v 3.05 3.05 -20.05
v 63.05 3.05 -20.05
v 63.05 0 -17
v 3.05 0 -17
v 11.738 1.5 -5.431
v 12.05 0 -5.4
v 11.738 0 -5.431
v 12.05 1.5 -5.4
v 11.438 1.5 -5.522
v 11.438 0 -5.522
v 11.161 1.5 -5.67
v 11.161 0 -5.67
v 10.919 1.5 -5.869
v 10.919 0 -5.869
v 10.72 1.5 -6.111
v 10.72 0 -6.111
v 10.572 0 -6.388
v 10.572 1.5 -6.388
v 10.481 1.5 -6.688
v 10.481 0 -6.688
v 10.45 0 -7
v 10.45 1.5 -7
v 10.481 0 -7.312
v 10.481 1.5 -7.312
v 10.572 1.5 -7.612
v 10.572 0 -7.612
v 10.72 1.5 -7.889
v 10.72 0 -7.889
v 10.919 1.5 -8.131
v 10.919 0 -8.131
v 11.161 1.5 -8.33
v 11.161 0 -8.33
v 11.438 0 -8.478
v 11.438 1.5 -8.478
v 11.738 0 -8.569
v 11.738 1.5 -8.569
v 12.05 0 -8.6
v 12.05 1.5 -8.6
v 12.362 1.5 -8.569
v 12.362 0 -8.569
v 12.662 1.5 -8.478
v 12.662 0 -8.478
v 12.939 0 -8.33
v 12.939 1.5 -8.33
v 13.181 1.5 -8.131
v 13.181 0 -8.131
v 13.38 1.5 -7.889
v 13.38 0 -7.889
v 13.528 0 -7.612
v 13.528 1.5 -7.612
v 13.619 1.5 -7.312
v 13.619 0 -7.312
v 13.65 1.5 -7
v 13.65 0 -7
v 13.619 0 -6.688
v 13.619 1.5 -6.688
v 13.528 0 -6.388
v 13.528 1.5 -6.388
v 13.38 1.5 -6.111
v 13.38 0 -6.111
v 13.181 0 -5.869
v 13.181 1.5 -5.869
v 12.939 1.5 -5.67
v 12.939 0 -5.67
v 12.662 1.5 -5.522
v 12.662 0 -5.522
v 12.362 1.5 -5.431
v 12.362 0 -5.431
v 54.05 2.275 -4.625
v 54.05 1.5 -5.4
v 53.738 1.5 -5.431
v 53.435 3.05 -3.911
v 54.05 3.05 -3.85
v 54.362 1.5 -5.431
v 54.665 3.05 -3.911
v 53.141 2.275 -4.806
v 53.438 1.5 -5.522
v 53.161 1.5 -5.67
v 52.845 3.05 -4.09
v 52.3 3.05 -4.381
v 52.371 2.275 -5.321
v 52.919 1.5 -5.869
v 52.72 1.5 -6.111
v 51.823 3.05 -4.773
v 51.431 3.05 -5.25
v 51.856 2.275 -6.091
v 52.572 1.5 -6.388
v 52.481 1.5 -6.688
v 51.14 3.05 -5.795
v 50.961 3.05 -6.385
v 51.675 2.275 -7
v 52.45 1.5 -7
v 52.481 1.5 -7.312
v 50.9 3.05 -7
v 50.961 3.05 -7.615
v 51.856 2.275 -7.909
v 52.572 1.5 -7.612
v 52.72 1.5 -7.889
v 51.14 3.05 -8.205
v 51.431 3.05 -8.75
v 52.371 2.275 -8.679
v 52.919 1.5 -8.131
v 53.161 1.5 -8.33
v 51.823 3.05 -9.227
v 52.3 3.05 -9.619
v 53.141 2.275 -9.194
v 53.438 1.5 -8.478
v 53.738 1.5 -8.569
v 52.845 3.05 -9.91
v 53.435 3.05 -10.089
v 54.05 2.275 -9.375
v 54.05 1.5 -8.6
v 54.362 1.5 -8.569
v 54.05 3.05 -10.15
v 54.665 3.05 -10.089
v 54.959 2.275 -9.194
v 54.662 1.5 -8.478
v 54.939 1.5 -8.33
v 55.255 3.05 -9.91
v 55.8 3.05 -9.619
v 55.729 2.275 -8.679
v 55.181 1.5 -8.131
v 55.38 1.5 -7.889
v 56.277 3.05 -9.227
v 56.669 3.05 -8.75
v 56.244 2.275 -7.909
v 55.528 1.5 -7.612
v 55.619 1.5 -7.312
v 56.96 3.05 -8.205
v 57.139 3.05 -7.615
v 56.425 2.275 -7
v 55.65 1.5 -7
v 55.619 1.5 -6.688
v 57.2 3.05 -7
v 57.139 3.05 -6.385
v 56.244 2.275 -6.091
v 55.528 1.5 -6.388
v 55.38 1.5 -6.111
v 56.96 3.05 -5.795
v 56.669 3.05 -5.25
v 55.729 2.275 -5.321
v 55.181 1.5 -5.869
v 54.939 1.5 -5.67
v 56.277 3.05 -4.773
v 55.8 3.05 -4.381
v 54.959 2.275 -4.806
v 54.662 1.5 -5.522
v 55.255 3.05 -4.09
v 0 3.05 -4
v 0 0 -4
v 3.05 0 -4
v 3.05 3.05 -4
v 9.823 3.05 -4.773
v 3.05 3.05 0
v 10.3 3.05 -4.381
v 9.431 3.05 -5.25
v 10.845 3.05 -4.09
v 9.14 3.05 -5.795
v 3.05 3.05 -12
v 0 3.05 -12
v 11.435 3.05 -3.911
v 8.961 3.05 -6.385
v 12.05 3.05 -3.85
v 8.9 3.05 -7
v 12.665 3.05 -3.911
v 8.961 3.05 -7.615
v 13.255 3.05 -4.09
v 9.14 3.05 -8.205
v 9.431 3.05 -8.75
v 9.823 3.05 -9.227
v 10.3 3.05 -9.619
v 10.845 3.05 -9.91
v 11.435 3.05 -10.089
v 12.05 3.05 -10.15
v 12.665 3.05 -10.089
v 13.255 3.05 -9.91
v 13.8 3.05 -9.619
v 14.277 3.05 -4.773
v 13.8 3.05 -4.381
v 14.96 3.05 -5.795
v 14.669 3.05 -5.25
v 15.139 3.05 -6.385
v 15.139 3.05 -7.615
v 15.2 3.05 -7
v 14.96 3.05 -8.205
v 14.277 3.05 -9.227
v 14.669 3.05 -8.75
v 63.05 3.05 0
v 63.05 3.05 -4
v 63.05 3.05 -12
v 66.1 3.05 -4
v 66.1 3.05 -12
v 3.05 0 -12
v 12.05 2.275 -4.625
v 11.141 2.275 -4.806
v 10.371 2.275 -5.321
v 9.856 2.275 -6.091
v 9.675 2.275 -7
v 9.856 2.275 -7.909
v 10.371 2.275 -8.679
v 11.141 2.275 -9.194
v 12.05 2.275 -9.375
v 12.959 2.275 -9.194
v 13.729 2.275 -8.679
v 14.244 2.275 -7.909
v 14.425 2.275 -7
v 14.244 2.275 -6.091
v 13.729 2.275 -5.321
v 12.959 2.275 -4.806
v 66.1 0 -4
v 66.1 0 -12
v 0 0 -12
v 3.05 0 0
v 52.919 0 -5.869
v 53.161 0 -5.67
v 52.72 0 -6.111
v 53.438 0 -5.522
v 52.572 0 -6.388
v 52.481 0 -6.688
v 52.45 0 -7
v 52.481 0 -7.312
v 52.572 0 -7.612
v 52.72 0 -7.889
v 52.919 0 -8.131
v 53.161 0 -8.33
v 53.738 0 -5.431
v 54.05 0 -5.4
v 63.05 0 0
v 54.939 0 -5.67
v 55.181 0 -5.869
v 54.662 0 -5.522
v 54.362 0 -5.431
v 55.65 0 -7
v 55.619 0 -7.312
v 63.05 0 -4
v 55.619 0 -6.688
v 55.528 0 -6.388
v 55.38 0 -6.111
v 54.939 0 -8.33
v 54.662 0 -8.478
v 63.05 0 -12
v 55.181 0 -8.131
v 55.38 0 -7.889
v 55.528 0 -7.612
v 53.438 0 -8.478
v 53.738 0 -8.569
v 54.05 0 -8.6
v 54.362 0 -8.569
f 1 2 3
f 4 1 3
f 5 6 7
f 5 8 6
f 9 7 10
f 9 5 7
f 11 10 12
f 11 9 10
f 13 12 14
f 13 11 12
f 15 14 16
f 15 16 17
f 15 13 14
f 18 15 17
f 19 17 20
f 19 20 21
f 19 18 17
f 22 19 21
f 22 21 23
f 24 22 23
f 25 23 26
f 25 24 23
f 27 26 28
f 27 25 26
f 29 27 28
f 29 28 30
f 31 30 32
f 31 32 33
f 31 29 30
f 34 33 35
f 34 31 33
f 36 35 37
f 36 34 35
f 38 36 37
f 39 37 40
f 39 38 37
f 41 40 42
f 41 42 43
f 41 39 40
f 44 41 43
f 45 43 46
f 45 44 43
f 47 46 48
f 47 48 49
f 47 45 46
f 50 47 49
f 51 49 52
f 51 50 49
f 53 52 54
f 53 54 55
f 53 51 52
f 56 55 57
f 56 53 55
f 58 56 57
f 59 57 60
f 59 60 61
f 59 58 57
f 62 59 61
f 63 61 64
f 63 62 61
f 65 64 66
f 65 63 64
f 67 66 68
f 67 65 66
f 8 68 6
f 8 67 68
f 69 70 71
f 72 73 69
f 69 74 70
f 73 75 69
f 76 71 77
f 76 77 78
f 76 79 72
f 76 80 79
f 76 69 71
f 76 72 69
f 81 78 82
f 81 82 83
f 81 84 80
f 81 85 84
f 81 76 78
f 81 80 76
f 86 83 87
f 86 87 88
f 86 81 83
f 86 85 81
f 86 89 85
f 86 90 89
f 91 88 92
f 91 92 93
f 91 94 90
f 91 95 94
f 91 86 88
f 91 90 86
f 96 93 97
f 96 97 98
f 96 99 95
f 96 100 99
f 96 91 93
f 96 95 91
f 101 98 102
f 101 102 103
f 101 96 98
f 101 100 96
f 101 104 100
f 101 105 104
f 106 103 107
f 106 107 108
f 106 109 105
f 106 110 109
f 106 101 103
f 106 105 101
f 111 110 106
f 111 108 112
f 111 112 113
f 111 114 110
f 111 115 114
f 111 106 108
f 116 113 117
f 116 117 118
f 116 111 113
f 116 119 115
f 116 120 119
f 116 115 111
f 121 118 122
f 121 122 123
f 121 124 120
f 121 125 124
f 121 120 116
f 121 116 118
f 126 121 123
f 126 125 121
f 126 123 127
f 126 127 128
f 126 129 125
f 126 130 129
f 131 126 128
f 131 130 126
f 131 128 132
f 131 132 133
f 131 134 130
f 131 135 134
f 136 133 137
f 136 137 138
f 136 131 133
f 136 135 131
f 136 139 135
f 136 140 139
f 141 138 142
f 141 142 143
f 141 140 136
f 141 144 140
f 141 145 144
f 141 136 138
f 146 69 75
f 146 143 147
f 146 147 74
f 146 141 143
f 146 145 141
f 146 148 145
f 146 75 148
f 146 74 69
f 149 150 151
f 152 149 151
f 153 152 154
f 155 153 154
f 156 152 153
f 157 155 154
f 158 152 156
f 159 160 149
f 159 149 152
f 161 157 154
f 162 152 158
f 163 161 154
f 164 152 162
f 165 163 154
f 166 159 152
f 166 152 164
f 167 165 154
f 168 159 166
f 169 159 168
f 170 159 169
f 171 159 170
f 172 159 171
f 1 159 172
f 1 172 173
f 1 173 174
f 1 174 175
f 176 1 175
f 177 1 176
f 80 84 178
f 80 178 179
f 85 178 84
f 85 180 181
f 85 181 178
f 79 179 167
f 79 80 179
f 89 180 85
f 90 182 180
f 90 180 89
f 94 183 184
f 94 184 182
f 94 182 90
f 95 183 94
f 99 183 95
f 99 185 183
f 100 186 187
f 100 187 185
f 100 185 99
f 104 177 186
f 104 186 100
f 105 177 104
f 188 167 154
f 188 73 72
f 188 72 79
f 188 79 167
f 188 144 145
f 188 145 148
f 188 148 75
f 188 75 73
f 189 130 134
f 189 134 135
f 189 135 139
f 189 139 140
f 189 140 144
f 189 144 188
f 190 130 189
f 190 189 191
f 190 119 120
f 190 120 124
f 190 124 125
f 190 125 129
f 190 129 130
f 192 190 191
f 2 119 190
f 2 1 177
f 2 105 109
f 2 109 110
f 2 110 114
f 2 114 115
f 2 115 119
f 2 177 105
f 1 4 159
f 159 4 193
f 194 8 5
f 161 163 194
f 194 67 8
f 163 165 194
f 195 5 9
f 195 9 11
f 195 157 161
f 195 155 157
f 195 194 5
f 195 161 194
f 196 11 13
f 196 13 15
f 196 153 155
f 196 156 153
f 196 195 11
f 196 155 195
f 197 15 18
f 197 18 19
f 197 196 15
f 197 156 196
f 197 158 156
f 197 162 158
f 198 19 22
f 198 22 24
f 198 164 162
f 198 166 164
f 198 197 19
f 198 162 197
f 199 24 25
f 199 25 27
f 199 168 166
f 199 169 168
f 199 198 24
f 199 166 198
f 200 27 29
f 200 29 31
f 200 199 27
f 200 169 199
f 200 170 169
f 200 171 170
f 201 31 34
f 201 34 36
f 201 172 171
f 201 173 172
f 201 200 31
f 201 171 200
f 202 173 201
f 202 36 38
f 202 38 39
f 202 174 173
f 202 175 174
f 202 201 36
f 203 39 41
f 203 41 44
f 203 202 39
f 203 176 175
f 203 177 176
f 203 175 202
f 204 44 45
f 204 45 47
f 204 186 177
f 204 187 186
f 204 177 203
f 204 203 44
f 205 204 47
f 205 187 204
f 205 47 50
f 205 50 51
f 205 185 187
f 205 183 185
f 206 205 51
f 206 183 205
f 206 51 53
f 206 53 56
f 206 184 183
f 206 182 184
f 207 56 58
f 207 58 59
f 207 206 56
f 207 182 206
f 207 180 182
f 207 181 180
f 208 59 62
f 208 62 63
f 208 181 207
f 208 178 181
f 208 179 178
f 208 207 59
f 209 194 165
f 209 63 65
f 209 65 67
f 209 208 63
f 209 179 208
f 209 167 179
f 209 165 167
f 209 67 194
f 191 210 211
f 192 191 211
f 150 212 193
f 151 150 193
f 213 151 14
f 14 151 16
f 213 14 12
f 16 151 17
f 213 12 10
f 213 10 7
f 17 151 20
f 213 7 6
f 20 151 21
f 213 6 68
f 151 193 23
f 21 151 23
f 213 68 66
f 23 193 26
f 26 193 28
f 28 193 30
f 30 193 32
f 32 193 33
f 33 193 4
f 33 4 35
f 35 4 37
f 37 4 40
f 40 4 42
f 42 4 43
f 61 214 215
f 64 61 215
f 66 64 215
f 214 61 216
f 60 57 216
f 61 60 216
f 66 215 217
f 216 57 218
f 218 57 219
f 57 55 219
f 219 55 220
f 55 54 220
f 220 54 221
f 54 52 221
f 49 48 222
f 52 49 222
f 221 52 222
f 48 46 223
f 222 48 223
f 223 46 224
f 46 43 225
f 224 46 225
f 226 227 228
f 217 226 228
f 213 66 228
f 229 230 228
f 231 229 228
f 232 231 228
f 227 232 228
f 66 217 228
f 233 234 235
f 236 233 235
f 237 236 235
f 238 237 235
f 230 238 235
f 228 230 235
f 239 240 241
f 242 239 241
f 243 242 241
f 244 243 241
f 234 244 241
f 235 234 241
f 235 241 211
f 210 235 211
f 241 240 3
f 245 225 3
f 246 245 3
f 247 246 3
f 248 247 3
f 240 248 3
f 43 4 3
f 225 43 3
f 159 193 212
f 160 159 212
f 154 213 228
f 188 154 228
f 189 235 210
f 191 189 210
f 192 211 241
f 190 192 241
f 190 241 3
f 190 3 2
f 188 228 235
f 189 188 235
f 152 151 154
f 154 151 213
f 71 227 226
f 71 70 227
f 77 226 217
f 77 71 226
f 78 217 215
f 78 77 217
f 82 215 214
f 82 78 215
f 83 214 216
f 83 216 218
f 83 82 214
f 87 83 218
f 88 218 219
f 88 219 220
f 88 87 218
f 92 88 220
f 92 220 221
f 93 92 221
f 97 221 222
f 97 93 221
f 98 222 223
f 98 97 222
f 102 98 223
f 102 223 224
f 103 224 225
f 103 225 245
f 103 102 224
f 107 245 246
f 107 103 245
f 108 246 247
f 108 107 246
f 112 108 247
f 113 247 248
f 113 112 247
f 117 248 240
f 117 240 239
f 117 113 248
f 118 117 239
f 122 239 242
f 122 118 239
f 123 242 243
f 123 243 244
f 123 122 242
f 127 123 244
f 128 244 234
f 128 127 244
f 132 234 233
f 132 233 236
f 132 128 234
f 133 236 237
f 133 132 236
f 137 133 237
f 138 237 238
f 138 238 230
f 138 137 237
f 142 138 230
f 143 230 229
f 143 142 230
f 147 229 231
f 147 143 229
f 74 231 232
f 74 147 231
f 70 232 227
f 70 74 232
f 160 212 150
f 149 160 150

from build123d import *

# Parameters (mm, degrees)
SKETCH1_R           = 1.5
BOSS_EXTRUDE1_DEPTH = 3.05
CUT_EXTRUDE1_DEPTH  = 67.231469106


with BuildPart() as part:
    # Sketch1 → Boss-Extrude1 (new body)
    with BuildSketch(Plane(origin=(0, 0, 0), x_dir=(1, 0, 0), z_dir=(0, 1, 0))):
        Polygon((3.05, 20.05), (3.05, 12), (0, 12), (0, 4), (3.05, 4), (3.05, 0), (63.05, 0), (63.05, 4), (66.1, 4), (66.1, 12), (63.05, 12), (63.05, 20.05), align=None)
        with Locations(Location((54.05, 7, 0), (0, 0, 270))):
            Circle(SKETCH1_R, mode=Mode.SUBTRACT)
        with Locations(Location((12.05, 7, 0), (0, 0, 270))):
            Circle(SKETCH1_R, mode=Mode.SUBTRACT)
    extrude(amount=BOSS_EXTRUDE1_DEPTH)

    # Sketch5 → CSK for M3 Flat Head Machine Screw1 (revolve, cut)
    with BuildSketch(Plane(origin=(12.05, 3.05, -7), x_dir=(0, 0, 1), z_dir=(1, 0, 0))):
        Polygon((0, 0), (0, 3.05), (1.6, 3.05), (1.6, 1.55), (3.15, 0), align=None)
    revolve(axis=Axis((12.05, 9.4, -7), (0, -1, 0)), mode=Mode.SUBTRACT)

    # Sketch7 → CSK for M3 Flat Head Machine Screw2 (revolve, cut)
    with BuildSketch(Plane(origin=(54.05, 3.05, -7), x_dir=(0, 0, 1), z_dir=(1, 0, 0))):
        Polygon((0, 0), (0, 3.05), (1.6, 3.05), (1.6, 1.55), (3.15, 0), align=None)
    revolve(axis=Axis((54.05, 9.4, -7), (0, -1, 0)), mode=Mode.SUBTRACT)

    # Sketch8 → Cut-Extrude1 (cut, through all)
    with BuildSketch(Plane(origin=(63.05, 0, 0), x_dir=(0, 0, -1), z_dir=(1, 0, 0))):
        Polygon((20.05, 3.05), (17, 0), (20.05, 0), align=None)
    extrude(amount=-CUT_EXTRUDE1_DEPTH, mode=Mode.SUBTRACT)


solid = part.part
